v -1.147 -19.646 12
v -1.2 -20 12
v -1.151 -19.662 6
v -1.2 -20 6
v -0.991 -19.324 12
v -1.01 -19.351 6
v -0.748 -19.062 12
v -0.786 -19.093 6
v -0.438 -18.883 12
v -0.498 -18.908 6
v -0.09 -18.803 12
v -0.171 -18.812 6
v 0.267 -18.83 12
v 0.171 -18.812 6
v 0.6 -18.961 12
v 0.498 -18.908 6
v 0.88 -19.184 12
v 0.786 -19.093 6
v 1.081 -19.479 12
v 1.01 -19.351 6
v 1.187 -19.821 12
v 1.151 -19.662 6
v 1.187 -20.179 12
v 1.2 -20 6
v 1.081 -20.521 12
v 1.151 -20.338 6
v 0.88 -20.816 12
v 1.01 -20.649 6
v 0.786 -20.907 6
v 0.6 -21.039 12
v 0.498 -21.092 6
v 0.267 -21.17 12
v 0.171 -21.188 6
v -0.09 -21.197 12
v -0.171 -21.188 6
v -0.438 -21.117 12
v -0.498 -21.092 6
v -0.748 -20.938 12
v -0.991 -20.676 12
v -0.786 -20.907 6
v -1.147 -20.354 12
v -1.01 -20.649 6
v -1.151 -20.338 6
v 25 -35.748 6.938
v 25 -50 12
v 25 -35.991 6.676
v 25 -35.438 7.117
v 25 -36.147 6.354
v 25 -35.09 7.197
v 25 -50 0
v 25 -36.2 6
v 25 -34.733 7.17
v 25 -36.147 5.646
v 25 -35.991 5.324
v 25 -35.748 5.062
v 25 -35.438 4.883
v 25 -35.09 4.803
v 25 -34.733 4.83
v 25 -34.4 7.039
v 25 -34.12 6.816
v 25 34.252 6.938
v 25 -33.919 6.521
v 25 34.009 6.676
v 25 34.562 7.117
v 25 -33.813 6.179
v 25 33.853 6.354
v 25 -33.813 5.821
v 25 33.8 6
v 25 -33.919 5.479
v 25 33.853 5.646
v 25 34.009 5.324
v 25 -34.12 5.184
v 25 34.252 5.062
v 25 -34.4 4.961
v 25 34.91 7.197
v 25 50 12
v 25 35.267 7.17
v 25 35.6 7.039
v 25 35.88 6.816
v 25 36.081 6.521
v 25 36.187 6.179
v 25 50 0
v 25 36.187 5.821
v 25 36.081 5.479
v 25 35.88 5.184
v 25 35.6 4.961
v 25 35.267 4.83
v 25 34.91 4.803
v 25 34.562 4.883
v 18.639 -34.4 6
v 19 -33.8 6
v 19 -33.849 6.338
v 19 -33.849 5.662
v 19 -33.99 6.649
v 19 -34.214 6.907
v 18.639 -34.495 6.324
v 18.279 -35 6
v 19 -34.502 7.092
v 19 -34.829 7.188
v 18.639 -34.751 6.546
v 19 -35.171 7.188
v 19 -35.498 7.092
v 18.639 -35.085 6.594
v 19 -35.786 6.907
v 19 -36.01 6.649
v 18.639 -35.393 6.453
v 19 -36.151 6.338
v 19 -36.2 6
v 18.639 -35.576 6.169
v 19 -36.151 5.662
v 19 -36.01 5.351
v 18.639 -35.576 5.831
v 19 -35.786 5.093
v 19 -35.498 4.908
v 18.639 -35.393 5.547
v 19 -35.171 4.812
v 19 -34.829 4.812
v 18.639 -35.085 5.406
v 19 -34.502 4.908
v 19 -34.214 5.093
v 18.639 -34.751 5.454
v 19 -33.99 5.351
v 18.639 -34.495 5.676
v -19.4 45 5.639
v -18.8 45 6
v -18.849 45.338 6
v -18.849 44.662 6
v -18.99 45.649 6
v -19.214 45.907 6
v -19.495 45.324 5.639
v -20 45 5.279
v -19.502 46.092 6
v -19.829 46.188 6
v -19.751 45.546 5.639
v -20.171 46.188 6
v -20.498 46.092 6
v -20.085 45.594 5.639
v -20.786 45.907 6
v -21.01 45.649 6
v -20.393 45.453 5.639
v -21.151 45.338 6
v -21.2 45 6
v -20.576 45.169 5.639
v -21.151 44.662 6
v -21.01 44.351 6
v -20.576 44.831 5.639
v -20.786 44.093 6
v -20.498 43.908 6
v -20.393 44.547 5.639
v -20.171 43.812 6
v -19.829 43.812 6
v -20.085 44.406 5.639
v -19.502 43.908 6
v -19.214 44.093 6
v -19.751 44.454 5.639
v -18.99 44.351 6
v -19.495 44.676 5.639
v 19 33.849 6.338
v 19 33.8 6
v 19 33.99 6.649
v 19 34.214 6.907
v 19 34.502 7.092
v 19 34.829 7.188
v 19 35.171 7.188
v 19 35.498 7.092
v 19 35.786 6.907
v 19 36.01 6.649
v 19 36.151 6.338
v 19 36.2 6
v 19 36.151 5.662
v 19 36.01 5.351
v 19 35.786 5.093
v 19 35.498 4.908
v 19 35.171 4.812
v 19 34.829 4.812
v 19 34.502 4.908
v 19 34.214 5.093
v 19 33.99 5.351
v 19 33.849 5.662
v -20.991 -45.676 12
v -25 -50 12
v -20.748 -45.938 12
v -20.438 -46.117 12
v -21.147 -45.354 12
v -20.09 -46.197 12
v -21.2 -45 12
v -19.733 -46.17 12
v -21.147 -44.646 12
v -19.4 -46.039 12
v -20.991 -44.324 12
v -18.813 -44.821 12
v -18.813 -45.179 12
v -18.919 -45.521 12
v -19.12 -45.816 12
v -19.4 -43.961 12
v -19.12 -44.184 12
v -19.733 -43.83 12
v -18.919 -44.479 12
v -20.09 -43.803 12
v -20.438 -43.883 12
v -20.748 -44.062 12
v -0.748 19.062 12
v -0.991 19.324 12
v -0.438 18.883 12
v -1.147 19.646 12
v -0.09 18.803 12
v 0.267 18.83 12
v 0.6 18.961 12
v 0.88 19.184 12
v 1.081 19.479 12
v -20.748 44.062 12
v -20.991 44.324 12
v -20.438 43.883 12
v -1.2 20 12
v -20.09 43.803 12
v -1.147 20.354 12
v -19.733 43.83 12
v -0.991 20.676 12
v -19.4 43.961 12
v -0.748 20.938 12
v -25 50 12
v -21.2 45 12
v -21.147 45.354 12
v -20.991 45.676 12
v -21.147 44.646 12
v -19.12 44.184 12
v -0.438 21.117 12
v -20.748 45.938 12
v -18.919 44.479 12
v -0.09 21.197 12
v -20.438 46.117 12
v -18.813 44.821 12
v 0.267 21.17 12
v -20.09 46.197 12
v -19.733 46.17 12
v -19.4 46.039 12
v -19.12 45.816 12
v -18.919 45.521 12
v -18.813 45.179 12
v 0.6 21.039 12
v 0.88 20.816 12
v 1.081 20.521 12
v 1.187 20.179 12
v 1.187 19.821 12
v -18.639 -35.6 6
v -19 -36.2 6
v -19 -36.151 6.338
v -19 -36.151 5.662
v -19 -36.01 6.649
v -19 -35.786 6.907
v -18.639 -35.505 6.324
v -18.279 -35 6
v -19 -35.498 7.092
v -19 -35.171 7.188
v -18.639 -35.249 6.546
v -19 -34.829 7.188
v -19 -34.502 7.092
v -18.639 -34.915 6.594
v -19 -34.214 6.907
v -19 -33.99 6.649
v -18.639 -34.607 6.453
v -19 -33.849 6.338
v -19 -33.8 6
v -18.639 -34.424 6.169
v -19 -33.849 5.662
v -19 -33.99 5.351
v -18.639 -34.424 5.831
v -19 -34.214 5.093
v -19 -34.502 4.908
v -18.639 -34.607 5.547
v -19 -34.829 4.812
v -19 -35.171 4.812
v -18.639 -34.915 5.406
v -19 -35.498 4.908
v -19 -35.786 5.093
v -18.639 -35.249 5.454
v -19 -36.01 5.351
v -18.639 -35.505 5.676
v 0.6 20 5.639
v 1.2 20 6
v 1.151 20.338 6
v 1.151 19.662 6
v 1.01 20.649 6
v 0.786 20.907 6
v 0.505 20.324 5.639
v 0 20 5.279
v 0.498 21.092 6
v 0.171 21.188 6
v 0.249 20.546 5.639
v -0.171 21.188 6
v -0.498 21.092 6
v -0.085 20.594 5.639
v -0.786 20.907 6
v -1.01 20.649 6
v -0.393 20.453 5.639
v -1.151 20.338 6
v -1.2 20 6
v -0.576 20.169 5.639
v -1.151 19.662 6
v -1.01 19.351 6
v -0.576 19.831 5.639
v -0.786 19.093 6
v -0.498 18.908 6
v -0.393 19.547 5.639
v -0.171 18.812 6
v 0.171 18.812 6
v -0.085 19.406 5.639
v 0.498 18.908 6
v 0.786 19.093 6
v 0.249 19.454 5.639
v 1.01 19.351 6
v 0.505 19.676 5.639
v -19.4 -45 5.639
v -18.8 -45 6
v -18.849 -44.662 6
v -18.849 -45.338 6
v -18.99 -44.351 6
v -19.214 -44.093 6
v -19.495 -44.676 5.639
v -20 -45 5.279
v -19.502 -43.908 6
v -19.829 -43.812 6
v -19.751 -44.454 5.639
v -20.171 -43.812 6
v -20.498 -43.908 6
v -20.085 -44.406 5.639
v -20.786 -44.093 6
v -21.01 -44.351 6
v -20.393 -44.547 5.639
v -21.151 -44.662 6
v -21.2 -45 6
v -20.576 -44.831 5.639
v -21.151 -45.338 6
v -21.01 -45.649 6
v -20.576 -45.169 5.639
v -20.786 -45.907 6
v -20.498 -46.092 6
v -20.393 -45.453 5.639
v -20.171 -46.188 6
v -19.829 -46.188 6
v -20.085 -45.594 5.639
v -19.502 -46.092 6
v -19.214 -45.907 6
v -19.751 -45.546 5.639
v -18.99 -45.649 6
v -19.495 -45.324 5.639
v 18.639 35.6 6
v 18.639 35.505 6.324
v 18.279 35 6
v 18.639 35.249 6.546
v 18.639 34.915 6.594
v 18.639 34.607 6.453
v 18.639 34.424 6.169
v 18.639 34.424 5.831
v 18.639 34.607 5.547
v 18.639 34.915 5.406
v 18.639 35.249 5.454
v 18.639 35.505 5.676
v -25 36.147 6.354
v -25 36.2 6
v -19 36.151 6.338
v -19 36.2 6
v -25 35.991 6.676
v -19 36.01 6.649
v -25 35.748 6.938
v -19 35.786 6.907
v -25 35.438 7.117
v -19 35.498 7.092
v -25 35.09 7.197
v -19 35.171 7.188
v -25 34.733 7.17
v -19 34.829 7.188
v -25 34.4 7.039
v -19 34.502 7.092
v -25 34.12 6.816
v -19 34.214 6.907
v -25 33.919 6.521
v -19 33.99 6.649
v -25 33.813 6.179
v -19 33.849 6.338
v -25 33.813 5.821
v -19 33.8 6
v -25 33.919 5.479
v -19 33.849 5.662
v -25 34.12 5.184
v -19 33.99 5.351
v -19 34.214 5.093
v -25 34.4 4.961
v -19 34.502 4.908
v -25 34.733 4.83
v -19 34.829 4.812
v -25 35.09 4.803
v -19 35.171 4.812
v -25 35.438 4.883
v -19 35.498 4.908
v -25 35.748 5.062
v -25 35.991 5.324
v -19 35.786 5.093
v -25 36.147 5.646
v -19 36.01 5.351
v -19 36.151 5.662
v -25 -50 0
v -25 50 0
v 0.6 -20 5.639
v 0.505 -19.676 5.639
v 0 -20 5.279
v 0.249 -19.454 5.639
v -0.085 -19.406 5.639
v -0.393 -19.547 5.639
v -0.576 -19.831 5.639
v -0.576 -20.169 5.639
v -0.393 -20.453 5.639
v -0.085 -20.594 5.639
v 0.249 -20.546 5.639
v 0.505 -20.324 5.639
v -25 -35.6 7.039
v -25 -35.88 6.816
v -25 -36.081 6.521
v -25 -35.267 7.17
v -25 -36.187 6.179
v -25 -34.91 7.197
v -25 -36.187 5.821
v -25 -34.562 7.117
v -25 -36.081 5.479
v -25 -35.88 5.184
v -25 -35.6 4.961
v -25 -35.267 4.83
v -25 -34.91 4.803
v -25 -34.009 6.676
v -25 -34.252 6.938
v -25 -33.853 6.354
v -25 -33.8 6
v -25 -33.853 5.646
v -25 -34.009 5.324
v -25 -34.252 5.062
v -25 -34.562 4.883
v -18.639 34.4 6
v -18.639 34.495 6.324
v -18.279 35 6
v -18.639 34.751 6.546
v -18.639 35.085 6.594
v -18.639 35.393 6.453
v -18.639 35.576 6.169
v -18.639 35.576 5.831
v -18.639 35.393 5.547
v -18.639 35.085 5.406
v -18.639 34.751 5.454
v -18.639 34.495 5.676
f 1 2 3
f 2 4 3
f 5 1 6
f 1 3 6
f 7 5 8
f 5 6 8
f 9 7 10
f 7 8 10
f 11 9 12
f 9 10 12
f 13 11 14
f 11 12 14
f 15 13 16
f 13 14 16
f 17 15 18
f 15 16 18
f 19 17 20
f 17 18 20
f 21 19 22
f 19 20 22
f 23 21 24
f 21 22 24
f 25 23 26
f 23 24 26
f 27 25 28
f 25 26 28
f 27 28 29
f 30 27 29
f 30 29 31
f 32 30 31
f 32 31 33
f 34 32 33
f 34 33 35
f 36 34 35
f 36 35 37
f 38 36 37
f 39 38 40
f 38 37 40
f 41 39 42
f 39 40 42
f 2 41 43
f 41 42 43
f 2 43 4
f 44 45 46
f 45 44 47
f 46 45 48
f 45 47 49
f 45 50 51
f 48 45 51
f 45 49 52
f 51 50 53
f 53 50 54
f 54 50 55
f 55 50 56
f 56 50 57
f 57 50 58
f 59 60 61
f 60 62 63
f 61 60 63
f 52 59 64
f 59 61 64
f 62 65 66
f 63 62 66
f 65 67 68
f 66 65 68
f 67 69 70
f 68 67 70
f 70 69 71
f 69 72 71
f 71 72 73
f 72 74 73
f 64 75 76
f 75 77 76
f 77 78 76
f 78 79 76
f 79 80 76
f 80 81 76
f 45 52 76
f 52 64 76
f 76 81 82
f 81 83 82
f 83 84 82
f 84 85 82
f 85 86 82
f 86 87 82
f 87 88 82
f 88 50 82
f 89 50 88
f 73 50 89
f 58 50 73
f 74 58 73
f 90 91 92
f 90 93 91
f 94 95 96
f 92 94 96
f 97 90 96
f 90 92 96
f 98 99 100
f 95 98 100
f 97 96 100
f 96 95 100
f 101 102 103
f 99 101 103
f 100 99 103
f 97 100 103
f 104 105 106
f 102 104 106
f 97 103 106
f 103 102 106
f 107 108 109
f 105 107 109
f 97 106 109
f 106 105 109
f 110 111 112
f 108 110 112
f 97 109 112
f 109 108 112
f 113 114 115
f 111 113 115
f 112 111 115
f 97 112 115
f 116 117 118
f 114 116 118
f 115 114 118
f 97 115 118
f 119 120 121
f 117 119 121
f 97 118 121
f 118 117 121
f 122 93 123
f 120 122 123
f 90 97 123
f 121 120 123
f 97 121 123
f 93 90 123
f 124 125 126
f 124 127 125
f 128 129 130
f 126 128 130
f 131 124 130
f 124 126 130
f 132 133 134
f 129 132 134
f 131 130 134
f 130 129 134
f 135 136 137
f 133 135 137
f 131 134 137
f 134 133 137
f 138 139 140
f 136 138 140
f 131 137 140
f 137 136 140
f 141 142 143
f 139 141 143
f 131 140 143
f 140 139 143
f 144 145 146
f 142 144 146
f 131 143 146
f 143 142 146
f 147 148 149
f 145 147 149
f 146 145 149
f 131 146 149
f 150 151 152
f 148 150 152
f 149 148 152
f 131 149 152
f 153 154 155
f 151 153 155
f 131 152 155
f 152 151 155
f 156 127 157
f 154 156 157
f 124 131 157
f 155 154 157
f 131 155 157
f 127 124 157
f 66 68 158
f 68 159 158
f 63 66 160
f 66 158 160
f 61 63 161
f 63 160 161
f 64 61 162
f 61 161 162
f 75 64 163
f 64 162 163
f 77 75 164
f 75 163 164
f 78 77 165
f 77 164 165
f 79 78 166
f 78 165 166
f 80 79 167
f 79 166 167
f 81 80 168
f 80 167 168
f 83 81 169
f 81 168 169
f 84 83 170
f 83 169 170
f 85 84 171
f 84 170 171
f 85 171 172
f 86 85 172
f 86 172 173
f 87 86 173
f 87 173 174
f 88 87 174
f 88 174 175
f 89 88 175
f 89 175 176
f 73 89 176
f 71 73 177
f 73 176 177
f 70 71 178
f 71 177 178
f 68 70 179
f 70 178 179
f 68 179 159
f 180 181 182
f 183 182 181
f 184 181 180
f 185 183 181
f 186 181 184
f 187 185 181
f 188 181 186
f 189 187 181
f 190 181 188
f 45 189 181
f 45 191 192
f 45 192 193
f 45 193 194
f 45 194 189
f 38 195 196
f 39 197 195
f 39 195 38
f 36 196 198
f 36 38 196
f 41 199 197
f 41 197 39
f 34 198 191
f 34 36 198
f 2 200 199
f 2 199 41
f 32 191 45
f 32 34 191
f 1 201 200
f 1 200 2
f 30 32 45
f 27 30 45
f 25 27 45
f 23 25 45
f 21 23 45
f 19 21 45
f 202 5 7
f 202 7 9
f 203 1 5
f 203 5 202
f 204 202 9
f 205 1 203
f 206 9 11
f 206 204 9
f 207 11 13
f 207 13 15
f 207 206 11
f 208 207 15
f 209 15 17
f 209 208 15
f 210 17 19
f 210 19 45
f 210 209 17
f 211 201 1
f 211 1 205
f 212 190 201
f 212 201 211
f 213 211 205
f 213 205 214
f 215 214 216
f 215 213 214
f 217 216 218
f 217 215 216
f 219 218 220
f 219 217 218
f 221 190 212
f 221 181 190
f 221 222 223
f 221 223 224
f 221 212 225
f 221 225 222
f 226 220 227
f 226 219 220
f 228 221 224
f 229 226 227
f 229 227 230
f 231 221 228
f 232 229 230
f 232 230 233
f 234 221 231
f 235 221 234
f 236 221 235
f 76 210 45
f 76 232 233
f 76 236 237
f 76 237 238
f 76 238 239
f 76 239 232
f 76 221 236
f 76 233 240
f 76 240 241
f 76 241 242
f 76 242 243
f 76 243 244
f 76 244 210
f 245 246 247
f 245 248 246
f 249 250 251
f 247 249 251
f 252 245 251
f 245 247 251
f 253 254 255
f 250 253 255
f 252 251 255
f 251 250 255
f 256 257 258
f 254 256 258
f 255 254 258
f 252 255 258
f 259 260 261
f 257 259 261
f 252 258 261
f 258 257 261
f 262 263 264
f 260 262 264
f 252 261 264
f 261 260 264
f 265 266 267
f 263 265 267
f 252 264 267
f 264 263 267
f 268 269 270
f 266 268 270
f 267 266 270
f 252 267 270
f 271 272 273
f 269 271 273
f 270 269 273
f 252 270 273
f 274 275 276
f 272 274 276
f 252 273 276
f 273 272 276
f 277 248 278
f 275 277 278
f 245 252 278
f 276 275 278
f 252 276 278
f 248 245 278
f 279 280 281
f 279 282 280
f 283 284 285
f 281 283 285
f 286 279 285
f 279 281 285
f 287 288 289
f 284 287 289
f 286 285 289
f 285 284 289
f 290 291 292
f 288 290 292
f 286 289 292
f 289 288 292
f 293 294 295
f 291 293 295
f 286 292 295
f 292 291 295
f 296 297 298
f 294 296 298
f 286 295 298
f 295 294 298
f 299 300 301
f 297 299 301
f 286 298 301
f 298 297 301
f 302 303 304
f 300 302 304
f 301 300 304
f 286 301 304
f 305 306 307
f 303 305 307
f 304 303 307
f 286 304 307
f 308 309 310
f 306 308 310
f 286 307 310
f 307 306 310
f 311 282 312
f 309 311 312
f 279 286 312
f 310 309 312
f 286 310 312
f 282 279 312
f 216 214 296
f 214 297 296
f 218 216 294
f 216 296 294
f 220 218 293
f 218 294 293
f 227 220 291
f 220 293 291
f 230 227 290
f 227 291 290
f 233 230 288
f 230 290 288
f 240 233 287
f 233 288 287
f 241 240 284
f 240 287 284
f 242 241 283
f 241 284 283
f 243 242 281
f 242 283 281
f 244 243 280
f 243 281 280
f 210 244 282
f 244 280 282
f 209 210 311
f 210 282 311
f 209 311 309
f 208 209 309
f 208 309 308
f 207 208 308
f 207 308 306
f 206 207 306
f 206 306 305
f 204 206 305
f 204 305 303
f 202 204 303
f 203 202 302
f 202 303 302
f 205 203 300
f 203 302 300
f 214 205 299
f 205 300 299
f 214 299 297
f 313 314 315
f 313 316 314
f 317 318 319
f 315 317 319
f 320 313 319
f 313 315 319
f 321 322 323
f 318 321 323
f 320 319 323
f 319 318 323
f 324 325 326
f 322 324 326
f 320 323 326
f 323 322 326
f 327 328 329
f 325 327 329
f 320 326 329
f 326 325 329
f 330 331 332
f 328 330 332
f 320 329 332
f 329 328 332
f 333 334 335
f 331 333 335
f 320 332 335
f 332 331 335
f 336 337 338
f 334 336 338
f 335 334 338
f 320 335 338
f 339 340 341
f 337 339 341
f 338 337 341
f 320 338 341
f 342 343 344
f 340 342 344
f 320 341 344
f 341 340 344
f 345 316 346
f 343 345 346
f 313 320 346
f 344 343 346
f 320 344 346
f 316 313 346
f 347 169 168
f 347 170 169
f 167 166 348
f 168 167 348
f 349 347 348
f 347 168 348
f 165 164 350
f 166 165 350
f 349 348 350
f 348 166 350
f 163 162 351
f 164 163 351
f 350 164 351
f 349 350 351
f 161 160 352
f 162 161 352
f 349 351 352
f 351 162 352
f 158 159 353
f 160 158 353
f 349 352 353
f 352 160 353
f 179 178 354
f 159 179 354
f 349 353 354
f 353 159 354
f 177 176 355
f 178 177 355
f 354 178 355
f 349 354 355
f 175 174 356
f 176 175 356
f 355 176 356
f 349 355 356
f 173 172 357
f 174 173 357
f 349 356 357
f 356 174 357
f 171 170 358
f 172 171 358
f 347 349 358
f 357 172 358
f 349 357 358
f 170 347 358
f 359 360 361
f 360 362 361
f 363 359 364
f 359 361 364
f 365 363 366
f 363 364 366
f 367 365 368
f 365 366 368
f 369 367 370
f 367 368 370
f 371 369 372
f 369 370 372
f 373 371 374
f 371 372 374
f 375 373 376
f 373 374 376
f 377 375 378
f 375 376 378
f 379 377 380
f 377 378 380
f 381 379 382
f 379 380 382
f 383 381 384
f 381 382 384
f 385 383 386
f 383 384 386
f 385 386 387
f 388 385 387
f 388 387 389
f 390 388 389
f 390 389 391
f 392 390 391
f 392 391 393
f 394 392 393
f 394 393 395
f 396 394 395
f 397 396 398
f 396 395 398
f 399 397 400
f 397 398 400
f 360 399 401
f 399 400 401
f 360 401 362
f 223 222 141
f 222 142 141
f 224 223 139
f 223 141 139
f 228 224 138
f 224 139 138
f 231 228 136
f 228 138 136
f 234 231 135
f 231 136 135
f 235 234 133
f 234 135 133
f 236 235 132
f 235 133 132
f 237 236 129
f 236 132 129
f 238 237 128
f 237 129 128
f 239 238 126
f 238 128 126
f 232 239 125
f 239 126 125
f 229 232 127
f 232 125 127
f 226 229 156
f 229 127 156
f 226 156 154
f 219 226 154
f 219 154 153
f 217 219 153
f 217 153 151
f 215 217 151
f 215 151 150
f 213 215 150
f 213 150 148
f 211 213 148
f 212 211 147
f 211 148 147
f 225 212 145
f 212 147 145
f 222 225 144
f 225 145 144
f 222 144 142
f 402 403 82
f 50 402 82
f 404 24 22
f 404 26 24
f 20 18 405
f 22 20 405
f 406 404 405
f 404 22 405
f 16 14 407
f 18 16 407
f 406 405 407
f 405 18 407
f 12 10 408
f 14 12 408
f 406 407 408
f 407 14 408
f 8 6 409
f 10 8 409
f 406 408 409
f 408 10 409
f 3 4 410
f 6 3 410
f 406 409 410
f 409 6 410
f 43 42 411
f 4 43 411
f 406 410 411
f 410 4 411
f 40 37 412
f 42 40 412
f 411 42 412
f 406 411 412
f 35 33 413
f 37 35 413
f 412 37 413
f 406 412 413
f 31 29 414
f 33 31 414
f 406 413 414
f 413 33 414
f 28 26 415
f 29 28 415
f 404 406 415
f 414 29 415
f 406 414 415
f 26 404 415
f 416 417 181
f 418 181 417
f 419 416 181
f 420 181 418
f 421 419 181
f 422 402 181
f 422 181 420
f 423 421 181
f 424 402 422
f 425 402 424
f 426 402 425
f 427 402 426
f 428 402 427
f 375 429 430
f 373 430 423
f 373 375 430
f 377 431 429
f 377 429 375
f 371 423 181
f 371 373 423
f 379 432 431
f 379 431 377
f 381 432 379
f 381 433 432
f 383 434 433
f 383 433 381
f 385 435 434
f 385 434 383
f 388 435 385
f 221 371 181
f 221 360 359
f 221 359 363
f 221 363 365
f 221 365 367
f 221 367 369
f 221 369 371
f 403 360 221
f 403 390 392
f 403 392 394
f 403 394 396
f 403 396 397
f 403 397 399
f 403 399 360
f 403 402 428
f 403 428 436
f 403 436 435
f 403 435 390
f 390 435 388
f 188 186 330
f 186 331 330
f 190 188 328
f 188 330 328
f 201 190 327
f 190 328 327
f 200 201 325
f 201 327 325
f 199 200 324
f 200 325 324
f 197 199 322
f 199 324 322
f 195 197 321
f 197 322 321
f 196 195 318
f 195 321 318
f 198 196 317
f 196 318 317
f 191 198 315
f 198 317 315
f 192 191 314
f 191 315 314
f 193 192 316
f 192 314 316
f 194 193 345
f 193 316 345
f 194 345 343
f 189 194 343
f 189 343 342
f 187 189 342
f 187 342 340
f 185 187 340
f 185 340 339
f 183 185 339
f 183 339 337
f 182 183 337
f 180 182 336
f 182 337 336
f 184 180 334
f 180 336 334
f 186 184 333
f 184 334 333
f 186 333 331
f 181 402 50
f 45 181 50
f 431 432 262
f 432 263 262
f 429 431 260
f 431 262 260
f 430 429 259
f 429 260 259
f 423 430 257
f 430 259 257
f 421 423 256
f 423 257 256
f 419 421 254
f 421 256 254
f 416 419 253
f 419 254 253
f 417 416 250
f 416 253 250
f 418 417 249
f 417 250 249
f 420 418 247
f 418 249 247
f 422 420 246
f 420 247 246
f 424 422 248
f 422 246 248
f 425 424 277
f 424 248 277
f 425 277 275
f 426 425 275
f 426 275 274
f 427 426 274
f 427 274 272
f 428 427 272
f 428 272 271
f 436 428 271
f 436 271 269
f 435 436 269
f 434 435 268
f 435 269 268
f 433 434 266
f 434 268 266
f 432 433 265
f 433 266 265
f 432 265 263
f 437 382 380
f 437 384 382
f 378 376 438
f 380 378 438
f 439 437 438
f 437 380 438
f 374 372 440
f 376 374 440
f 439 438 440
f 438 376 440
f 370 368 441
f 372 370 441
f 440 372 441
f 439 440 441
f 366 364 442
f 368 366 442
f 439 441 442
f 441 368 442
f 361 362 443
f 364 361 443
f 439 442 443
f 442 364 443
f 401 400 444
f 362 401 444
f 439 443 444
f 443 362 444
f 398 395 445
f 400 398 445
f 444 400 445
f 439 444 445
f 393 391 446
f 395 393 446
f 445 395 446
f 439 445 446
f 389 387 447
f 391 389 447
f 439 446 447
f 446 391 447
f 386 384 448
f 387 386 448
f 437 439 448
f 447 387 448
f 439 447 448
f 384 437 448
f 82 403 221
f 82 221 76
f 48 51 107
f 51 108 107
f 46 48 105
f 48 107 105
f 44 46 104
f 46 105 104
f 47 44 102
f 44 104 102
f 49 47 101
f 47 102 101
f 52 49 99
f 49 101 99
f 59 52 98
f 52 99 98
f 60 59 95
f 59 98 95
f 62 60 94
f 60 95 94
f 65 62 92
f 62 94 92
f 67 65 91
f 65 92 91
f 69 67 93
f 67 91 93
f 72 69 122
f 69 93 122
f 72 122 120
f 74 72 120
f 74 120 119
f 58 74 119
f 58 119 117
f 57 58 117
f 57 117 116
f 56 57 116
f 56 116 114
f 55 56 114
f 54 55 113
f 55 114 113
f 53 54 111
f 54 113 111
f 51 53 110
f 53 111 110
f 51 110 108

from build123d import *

# Parameters (mm, degrees)
F0_W     = 50
F0_H     = 100
F1_DEPTH = 12
F3_D     = 2.4
F3_DEPTH = 6
F3_TIP   = 0.7210327428
F5_D     = 2.4
F5_DEPTH = 6
F5_TIP   = 0.7210327428
F7_D     = 2.4
F7_DEPTH = 6
F7_TIP   = 0.7210327428
F9_D     = 2.4
F9_DEPTH = 6
F9_TIP   = 0.7210327428


with BuildPart() as f1:
    # F0 (on Top) → F1 (new body)
    with BuildSketch(Plane.XY):
        Rectangle(F0_W, F0_H)
    extrude(amount=F1_DEPTH)

    # F3
    with Locations(Plane.XY.offset(12)):
        with Locations((0, 20), (0, -20)):
            Hole(F3_D / 2, depth=F3_DEPTH)
            with Locations((0, 0, -(F3_DEPTH + F3_TIP / 2))):  # 118° drill point
                Cone(0, F3_D / 2, F3_TIP, mode=Mode.SUBTRACT)

    # F5
    with Locations(Plane.YZ.offset(25)):
        with Locations((-35, 6), (35, 6)):
            Hole(F5_D / 2, depth=F5_DEPTH)
            with Locations((0, 0, -(F5_DEPTH + F5_TIP / 2))):  # 118° drill point
                Cone(0, F5_D / 2, F5_TIP, mode=Mode.SUBTRACT)

    # F7
    with Locations(Plane(origin=(-25, 0, 0), x_dir=(0, -1, 0), z_dir=(-1, 0, 0))):
        with Locations((-35, 6), (35, 6)):
            Hole(F7_D / 2, depth=F7_DEPTH)
            with Locations((0, 0, -(F7_DEPTH + F7_TIP / 2))):  # 118° drill point
                Cone(0, F7_D / 2, F7_TIP, mode=Mode.SUBTRACT)

    # F9
    with Locations(Plane.XY.offset(12)):
        with Locations((-20, -45), (-20, 45)):
            Hole(F9_D / 2, depth=F9_DEPTH)
            with Locations((0, 0, -(F9_DEPTH + F9_TIP / 2))):  # 118° drill point
                Cone(0, F9_D / 2, F9_TIP, mode=Mode.SUBTRACT)


solid = f1.part
